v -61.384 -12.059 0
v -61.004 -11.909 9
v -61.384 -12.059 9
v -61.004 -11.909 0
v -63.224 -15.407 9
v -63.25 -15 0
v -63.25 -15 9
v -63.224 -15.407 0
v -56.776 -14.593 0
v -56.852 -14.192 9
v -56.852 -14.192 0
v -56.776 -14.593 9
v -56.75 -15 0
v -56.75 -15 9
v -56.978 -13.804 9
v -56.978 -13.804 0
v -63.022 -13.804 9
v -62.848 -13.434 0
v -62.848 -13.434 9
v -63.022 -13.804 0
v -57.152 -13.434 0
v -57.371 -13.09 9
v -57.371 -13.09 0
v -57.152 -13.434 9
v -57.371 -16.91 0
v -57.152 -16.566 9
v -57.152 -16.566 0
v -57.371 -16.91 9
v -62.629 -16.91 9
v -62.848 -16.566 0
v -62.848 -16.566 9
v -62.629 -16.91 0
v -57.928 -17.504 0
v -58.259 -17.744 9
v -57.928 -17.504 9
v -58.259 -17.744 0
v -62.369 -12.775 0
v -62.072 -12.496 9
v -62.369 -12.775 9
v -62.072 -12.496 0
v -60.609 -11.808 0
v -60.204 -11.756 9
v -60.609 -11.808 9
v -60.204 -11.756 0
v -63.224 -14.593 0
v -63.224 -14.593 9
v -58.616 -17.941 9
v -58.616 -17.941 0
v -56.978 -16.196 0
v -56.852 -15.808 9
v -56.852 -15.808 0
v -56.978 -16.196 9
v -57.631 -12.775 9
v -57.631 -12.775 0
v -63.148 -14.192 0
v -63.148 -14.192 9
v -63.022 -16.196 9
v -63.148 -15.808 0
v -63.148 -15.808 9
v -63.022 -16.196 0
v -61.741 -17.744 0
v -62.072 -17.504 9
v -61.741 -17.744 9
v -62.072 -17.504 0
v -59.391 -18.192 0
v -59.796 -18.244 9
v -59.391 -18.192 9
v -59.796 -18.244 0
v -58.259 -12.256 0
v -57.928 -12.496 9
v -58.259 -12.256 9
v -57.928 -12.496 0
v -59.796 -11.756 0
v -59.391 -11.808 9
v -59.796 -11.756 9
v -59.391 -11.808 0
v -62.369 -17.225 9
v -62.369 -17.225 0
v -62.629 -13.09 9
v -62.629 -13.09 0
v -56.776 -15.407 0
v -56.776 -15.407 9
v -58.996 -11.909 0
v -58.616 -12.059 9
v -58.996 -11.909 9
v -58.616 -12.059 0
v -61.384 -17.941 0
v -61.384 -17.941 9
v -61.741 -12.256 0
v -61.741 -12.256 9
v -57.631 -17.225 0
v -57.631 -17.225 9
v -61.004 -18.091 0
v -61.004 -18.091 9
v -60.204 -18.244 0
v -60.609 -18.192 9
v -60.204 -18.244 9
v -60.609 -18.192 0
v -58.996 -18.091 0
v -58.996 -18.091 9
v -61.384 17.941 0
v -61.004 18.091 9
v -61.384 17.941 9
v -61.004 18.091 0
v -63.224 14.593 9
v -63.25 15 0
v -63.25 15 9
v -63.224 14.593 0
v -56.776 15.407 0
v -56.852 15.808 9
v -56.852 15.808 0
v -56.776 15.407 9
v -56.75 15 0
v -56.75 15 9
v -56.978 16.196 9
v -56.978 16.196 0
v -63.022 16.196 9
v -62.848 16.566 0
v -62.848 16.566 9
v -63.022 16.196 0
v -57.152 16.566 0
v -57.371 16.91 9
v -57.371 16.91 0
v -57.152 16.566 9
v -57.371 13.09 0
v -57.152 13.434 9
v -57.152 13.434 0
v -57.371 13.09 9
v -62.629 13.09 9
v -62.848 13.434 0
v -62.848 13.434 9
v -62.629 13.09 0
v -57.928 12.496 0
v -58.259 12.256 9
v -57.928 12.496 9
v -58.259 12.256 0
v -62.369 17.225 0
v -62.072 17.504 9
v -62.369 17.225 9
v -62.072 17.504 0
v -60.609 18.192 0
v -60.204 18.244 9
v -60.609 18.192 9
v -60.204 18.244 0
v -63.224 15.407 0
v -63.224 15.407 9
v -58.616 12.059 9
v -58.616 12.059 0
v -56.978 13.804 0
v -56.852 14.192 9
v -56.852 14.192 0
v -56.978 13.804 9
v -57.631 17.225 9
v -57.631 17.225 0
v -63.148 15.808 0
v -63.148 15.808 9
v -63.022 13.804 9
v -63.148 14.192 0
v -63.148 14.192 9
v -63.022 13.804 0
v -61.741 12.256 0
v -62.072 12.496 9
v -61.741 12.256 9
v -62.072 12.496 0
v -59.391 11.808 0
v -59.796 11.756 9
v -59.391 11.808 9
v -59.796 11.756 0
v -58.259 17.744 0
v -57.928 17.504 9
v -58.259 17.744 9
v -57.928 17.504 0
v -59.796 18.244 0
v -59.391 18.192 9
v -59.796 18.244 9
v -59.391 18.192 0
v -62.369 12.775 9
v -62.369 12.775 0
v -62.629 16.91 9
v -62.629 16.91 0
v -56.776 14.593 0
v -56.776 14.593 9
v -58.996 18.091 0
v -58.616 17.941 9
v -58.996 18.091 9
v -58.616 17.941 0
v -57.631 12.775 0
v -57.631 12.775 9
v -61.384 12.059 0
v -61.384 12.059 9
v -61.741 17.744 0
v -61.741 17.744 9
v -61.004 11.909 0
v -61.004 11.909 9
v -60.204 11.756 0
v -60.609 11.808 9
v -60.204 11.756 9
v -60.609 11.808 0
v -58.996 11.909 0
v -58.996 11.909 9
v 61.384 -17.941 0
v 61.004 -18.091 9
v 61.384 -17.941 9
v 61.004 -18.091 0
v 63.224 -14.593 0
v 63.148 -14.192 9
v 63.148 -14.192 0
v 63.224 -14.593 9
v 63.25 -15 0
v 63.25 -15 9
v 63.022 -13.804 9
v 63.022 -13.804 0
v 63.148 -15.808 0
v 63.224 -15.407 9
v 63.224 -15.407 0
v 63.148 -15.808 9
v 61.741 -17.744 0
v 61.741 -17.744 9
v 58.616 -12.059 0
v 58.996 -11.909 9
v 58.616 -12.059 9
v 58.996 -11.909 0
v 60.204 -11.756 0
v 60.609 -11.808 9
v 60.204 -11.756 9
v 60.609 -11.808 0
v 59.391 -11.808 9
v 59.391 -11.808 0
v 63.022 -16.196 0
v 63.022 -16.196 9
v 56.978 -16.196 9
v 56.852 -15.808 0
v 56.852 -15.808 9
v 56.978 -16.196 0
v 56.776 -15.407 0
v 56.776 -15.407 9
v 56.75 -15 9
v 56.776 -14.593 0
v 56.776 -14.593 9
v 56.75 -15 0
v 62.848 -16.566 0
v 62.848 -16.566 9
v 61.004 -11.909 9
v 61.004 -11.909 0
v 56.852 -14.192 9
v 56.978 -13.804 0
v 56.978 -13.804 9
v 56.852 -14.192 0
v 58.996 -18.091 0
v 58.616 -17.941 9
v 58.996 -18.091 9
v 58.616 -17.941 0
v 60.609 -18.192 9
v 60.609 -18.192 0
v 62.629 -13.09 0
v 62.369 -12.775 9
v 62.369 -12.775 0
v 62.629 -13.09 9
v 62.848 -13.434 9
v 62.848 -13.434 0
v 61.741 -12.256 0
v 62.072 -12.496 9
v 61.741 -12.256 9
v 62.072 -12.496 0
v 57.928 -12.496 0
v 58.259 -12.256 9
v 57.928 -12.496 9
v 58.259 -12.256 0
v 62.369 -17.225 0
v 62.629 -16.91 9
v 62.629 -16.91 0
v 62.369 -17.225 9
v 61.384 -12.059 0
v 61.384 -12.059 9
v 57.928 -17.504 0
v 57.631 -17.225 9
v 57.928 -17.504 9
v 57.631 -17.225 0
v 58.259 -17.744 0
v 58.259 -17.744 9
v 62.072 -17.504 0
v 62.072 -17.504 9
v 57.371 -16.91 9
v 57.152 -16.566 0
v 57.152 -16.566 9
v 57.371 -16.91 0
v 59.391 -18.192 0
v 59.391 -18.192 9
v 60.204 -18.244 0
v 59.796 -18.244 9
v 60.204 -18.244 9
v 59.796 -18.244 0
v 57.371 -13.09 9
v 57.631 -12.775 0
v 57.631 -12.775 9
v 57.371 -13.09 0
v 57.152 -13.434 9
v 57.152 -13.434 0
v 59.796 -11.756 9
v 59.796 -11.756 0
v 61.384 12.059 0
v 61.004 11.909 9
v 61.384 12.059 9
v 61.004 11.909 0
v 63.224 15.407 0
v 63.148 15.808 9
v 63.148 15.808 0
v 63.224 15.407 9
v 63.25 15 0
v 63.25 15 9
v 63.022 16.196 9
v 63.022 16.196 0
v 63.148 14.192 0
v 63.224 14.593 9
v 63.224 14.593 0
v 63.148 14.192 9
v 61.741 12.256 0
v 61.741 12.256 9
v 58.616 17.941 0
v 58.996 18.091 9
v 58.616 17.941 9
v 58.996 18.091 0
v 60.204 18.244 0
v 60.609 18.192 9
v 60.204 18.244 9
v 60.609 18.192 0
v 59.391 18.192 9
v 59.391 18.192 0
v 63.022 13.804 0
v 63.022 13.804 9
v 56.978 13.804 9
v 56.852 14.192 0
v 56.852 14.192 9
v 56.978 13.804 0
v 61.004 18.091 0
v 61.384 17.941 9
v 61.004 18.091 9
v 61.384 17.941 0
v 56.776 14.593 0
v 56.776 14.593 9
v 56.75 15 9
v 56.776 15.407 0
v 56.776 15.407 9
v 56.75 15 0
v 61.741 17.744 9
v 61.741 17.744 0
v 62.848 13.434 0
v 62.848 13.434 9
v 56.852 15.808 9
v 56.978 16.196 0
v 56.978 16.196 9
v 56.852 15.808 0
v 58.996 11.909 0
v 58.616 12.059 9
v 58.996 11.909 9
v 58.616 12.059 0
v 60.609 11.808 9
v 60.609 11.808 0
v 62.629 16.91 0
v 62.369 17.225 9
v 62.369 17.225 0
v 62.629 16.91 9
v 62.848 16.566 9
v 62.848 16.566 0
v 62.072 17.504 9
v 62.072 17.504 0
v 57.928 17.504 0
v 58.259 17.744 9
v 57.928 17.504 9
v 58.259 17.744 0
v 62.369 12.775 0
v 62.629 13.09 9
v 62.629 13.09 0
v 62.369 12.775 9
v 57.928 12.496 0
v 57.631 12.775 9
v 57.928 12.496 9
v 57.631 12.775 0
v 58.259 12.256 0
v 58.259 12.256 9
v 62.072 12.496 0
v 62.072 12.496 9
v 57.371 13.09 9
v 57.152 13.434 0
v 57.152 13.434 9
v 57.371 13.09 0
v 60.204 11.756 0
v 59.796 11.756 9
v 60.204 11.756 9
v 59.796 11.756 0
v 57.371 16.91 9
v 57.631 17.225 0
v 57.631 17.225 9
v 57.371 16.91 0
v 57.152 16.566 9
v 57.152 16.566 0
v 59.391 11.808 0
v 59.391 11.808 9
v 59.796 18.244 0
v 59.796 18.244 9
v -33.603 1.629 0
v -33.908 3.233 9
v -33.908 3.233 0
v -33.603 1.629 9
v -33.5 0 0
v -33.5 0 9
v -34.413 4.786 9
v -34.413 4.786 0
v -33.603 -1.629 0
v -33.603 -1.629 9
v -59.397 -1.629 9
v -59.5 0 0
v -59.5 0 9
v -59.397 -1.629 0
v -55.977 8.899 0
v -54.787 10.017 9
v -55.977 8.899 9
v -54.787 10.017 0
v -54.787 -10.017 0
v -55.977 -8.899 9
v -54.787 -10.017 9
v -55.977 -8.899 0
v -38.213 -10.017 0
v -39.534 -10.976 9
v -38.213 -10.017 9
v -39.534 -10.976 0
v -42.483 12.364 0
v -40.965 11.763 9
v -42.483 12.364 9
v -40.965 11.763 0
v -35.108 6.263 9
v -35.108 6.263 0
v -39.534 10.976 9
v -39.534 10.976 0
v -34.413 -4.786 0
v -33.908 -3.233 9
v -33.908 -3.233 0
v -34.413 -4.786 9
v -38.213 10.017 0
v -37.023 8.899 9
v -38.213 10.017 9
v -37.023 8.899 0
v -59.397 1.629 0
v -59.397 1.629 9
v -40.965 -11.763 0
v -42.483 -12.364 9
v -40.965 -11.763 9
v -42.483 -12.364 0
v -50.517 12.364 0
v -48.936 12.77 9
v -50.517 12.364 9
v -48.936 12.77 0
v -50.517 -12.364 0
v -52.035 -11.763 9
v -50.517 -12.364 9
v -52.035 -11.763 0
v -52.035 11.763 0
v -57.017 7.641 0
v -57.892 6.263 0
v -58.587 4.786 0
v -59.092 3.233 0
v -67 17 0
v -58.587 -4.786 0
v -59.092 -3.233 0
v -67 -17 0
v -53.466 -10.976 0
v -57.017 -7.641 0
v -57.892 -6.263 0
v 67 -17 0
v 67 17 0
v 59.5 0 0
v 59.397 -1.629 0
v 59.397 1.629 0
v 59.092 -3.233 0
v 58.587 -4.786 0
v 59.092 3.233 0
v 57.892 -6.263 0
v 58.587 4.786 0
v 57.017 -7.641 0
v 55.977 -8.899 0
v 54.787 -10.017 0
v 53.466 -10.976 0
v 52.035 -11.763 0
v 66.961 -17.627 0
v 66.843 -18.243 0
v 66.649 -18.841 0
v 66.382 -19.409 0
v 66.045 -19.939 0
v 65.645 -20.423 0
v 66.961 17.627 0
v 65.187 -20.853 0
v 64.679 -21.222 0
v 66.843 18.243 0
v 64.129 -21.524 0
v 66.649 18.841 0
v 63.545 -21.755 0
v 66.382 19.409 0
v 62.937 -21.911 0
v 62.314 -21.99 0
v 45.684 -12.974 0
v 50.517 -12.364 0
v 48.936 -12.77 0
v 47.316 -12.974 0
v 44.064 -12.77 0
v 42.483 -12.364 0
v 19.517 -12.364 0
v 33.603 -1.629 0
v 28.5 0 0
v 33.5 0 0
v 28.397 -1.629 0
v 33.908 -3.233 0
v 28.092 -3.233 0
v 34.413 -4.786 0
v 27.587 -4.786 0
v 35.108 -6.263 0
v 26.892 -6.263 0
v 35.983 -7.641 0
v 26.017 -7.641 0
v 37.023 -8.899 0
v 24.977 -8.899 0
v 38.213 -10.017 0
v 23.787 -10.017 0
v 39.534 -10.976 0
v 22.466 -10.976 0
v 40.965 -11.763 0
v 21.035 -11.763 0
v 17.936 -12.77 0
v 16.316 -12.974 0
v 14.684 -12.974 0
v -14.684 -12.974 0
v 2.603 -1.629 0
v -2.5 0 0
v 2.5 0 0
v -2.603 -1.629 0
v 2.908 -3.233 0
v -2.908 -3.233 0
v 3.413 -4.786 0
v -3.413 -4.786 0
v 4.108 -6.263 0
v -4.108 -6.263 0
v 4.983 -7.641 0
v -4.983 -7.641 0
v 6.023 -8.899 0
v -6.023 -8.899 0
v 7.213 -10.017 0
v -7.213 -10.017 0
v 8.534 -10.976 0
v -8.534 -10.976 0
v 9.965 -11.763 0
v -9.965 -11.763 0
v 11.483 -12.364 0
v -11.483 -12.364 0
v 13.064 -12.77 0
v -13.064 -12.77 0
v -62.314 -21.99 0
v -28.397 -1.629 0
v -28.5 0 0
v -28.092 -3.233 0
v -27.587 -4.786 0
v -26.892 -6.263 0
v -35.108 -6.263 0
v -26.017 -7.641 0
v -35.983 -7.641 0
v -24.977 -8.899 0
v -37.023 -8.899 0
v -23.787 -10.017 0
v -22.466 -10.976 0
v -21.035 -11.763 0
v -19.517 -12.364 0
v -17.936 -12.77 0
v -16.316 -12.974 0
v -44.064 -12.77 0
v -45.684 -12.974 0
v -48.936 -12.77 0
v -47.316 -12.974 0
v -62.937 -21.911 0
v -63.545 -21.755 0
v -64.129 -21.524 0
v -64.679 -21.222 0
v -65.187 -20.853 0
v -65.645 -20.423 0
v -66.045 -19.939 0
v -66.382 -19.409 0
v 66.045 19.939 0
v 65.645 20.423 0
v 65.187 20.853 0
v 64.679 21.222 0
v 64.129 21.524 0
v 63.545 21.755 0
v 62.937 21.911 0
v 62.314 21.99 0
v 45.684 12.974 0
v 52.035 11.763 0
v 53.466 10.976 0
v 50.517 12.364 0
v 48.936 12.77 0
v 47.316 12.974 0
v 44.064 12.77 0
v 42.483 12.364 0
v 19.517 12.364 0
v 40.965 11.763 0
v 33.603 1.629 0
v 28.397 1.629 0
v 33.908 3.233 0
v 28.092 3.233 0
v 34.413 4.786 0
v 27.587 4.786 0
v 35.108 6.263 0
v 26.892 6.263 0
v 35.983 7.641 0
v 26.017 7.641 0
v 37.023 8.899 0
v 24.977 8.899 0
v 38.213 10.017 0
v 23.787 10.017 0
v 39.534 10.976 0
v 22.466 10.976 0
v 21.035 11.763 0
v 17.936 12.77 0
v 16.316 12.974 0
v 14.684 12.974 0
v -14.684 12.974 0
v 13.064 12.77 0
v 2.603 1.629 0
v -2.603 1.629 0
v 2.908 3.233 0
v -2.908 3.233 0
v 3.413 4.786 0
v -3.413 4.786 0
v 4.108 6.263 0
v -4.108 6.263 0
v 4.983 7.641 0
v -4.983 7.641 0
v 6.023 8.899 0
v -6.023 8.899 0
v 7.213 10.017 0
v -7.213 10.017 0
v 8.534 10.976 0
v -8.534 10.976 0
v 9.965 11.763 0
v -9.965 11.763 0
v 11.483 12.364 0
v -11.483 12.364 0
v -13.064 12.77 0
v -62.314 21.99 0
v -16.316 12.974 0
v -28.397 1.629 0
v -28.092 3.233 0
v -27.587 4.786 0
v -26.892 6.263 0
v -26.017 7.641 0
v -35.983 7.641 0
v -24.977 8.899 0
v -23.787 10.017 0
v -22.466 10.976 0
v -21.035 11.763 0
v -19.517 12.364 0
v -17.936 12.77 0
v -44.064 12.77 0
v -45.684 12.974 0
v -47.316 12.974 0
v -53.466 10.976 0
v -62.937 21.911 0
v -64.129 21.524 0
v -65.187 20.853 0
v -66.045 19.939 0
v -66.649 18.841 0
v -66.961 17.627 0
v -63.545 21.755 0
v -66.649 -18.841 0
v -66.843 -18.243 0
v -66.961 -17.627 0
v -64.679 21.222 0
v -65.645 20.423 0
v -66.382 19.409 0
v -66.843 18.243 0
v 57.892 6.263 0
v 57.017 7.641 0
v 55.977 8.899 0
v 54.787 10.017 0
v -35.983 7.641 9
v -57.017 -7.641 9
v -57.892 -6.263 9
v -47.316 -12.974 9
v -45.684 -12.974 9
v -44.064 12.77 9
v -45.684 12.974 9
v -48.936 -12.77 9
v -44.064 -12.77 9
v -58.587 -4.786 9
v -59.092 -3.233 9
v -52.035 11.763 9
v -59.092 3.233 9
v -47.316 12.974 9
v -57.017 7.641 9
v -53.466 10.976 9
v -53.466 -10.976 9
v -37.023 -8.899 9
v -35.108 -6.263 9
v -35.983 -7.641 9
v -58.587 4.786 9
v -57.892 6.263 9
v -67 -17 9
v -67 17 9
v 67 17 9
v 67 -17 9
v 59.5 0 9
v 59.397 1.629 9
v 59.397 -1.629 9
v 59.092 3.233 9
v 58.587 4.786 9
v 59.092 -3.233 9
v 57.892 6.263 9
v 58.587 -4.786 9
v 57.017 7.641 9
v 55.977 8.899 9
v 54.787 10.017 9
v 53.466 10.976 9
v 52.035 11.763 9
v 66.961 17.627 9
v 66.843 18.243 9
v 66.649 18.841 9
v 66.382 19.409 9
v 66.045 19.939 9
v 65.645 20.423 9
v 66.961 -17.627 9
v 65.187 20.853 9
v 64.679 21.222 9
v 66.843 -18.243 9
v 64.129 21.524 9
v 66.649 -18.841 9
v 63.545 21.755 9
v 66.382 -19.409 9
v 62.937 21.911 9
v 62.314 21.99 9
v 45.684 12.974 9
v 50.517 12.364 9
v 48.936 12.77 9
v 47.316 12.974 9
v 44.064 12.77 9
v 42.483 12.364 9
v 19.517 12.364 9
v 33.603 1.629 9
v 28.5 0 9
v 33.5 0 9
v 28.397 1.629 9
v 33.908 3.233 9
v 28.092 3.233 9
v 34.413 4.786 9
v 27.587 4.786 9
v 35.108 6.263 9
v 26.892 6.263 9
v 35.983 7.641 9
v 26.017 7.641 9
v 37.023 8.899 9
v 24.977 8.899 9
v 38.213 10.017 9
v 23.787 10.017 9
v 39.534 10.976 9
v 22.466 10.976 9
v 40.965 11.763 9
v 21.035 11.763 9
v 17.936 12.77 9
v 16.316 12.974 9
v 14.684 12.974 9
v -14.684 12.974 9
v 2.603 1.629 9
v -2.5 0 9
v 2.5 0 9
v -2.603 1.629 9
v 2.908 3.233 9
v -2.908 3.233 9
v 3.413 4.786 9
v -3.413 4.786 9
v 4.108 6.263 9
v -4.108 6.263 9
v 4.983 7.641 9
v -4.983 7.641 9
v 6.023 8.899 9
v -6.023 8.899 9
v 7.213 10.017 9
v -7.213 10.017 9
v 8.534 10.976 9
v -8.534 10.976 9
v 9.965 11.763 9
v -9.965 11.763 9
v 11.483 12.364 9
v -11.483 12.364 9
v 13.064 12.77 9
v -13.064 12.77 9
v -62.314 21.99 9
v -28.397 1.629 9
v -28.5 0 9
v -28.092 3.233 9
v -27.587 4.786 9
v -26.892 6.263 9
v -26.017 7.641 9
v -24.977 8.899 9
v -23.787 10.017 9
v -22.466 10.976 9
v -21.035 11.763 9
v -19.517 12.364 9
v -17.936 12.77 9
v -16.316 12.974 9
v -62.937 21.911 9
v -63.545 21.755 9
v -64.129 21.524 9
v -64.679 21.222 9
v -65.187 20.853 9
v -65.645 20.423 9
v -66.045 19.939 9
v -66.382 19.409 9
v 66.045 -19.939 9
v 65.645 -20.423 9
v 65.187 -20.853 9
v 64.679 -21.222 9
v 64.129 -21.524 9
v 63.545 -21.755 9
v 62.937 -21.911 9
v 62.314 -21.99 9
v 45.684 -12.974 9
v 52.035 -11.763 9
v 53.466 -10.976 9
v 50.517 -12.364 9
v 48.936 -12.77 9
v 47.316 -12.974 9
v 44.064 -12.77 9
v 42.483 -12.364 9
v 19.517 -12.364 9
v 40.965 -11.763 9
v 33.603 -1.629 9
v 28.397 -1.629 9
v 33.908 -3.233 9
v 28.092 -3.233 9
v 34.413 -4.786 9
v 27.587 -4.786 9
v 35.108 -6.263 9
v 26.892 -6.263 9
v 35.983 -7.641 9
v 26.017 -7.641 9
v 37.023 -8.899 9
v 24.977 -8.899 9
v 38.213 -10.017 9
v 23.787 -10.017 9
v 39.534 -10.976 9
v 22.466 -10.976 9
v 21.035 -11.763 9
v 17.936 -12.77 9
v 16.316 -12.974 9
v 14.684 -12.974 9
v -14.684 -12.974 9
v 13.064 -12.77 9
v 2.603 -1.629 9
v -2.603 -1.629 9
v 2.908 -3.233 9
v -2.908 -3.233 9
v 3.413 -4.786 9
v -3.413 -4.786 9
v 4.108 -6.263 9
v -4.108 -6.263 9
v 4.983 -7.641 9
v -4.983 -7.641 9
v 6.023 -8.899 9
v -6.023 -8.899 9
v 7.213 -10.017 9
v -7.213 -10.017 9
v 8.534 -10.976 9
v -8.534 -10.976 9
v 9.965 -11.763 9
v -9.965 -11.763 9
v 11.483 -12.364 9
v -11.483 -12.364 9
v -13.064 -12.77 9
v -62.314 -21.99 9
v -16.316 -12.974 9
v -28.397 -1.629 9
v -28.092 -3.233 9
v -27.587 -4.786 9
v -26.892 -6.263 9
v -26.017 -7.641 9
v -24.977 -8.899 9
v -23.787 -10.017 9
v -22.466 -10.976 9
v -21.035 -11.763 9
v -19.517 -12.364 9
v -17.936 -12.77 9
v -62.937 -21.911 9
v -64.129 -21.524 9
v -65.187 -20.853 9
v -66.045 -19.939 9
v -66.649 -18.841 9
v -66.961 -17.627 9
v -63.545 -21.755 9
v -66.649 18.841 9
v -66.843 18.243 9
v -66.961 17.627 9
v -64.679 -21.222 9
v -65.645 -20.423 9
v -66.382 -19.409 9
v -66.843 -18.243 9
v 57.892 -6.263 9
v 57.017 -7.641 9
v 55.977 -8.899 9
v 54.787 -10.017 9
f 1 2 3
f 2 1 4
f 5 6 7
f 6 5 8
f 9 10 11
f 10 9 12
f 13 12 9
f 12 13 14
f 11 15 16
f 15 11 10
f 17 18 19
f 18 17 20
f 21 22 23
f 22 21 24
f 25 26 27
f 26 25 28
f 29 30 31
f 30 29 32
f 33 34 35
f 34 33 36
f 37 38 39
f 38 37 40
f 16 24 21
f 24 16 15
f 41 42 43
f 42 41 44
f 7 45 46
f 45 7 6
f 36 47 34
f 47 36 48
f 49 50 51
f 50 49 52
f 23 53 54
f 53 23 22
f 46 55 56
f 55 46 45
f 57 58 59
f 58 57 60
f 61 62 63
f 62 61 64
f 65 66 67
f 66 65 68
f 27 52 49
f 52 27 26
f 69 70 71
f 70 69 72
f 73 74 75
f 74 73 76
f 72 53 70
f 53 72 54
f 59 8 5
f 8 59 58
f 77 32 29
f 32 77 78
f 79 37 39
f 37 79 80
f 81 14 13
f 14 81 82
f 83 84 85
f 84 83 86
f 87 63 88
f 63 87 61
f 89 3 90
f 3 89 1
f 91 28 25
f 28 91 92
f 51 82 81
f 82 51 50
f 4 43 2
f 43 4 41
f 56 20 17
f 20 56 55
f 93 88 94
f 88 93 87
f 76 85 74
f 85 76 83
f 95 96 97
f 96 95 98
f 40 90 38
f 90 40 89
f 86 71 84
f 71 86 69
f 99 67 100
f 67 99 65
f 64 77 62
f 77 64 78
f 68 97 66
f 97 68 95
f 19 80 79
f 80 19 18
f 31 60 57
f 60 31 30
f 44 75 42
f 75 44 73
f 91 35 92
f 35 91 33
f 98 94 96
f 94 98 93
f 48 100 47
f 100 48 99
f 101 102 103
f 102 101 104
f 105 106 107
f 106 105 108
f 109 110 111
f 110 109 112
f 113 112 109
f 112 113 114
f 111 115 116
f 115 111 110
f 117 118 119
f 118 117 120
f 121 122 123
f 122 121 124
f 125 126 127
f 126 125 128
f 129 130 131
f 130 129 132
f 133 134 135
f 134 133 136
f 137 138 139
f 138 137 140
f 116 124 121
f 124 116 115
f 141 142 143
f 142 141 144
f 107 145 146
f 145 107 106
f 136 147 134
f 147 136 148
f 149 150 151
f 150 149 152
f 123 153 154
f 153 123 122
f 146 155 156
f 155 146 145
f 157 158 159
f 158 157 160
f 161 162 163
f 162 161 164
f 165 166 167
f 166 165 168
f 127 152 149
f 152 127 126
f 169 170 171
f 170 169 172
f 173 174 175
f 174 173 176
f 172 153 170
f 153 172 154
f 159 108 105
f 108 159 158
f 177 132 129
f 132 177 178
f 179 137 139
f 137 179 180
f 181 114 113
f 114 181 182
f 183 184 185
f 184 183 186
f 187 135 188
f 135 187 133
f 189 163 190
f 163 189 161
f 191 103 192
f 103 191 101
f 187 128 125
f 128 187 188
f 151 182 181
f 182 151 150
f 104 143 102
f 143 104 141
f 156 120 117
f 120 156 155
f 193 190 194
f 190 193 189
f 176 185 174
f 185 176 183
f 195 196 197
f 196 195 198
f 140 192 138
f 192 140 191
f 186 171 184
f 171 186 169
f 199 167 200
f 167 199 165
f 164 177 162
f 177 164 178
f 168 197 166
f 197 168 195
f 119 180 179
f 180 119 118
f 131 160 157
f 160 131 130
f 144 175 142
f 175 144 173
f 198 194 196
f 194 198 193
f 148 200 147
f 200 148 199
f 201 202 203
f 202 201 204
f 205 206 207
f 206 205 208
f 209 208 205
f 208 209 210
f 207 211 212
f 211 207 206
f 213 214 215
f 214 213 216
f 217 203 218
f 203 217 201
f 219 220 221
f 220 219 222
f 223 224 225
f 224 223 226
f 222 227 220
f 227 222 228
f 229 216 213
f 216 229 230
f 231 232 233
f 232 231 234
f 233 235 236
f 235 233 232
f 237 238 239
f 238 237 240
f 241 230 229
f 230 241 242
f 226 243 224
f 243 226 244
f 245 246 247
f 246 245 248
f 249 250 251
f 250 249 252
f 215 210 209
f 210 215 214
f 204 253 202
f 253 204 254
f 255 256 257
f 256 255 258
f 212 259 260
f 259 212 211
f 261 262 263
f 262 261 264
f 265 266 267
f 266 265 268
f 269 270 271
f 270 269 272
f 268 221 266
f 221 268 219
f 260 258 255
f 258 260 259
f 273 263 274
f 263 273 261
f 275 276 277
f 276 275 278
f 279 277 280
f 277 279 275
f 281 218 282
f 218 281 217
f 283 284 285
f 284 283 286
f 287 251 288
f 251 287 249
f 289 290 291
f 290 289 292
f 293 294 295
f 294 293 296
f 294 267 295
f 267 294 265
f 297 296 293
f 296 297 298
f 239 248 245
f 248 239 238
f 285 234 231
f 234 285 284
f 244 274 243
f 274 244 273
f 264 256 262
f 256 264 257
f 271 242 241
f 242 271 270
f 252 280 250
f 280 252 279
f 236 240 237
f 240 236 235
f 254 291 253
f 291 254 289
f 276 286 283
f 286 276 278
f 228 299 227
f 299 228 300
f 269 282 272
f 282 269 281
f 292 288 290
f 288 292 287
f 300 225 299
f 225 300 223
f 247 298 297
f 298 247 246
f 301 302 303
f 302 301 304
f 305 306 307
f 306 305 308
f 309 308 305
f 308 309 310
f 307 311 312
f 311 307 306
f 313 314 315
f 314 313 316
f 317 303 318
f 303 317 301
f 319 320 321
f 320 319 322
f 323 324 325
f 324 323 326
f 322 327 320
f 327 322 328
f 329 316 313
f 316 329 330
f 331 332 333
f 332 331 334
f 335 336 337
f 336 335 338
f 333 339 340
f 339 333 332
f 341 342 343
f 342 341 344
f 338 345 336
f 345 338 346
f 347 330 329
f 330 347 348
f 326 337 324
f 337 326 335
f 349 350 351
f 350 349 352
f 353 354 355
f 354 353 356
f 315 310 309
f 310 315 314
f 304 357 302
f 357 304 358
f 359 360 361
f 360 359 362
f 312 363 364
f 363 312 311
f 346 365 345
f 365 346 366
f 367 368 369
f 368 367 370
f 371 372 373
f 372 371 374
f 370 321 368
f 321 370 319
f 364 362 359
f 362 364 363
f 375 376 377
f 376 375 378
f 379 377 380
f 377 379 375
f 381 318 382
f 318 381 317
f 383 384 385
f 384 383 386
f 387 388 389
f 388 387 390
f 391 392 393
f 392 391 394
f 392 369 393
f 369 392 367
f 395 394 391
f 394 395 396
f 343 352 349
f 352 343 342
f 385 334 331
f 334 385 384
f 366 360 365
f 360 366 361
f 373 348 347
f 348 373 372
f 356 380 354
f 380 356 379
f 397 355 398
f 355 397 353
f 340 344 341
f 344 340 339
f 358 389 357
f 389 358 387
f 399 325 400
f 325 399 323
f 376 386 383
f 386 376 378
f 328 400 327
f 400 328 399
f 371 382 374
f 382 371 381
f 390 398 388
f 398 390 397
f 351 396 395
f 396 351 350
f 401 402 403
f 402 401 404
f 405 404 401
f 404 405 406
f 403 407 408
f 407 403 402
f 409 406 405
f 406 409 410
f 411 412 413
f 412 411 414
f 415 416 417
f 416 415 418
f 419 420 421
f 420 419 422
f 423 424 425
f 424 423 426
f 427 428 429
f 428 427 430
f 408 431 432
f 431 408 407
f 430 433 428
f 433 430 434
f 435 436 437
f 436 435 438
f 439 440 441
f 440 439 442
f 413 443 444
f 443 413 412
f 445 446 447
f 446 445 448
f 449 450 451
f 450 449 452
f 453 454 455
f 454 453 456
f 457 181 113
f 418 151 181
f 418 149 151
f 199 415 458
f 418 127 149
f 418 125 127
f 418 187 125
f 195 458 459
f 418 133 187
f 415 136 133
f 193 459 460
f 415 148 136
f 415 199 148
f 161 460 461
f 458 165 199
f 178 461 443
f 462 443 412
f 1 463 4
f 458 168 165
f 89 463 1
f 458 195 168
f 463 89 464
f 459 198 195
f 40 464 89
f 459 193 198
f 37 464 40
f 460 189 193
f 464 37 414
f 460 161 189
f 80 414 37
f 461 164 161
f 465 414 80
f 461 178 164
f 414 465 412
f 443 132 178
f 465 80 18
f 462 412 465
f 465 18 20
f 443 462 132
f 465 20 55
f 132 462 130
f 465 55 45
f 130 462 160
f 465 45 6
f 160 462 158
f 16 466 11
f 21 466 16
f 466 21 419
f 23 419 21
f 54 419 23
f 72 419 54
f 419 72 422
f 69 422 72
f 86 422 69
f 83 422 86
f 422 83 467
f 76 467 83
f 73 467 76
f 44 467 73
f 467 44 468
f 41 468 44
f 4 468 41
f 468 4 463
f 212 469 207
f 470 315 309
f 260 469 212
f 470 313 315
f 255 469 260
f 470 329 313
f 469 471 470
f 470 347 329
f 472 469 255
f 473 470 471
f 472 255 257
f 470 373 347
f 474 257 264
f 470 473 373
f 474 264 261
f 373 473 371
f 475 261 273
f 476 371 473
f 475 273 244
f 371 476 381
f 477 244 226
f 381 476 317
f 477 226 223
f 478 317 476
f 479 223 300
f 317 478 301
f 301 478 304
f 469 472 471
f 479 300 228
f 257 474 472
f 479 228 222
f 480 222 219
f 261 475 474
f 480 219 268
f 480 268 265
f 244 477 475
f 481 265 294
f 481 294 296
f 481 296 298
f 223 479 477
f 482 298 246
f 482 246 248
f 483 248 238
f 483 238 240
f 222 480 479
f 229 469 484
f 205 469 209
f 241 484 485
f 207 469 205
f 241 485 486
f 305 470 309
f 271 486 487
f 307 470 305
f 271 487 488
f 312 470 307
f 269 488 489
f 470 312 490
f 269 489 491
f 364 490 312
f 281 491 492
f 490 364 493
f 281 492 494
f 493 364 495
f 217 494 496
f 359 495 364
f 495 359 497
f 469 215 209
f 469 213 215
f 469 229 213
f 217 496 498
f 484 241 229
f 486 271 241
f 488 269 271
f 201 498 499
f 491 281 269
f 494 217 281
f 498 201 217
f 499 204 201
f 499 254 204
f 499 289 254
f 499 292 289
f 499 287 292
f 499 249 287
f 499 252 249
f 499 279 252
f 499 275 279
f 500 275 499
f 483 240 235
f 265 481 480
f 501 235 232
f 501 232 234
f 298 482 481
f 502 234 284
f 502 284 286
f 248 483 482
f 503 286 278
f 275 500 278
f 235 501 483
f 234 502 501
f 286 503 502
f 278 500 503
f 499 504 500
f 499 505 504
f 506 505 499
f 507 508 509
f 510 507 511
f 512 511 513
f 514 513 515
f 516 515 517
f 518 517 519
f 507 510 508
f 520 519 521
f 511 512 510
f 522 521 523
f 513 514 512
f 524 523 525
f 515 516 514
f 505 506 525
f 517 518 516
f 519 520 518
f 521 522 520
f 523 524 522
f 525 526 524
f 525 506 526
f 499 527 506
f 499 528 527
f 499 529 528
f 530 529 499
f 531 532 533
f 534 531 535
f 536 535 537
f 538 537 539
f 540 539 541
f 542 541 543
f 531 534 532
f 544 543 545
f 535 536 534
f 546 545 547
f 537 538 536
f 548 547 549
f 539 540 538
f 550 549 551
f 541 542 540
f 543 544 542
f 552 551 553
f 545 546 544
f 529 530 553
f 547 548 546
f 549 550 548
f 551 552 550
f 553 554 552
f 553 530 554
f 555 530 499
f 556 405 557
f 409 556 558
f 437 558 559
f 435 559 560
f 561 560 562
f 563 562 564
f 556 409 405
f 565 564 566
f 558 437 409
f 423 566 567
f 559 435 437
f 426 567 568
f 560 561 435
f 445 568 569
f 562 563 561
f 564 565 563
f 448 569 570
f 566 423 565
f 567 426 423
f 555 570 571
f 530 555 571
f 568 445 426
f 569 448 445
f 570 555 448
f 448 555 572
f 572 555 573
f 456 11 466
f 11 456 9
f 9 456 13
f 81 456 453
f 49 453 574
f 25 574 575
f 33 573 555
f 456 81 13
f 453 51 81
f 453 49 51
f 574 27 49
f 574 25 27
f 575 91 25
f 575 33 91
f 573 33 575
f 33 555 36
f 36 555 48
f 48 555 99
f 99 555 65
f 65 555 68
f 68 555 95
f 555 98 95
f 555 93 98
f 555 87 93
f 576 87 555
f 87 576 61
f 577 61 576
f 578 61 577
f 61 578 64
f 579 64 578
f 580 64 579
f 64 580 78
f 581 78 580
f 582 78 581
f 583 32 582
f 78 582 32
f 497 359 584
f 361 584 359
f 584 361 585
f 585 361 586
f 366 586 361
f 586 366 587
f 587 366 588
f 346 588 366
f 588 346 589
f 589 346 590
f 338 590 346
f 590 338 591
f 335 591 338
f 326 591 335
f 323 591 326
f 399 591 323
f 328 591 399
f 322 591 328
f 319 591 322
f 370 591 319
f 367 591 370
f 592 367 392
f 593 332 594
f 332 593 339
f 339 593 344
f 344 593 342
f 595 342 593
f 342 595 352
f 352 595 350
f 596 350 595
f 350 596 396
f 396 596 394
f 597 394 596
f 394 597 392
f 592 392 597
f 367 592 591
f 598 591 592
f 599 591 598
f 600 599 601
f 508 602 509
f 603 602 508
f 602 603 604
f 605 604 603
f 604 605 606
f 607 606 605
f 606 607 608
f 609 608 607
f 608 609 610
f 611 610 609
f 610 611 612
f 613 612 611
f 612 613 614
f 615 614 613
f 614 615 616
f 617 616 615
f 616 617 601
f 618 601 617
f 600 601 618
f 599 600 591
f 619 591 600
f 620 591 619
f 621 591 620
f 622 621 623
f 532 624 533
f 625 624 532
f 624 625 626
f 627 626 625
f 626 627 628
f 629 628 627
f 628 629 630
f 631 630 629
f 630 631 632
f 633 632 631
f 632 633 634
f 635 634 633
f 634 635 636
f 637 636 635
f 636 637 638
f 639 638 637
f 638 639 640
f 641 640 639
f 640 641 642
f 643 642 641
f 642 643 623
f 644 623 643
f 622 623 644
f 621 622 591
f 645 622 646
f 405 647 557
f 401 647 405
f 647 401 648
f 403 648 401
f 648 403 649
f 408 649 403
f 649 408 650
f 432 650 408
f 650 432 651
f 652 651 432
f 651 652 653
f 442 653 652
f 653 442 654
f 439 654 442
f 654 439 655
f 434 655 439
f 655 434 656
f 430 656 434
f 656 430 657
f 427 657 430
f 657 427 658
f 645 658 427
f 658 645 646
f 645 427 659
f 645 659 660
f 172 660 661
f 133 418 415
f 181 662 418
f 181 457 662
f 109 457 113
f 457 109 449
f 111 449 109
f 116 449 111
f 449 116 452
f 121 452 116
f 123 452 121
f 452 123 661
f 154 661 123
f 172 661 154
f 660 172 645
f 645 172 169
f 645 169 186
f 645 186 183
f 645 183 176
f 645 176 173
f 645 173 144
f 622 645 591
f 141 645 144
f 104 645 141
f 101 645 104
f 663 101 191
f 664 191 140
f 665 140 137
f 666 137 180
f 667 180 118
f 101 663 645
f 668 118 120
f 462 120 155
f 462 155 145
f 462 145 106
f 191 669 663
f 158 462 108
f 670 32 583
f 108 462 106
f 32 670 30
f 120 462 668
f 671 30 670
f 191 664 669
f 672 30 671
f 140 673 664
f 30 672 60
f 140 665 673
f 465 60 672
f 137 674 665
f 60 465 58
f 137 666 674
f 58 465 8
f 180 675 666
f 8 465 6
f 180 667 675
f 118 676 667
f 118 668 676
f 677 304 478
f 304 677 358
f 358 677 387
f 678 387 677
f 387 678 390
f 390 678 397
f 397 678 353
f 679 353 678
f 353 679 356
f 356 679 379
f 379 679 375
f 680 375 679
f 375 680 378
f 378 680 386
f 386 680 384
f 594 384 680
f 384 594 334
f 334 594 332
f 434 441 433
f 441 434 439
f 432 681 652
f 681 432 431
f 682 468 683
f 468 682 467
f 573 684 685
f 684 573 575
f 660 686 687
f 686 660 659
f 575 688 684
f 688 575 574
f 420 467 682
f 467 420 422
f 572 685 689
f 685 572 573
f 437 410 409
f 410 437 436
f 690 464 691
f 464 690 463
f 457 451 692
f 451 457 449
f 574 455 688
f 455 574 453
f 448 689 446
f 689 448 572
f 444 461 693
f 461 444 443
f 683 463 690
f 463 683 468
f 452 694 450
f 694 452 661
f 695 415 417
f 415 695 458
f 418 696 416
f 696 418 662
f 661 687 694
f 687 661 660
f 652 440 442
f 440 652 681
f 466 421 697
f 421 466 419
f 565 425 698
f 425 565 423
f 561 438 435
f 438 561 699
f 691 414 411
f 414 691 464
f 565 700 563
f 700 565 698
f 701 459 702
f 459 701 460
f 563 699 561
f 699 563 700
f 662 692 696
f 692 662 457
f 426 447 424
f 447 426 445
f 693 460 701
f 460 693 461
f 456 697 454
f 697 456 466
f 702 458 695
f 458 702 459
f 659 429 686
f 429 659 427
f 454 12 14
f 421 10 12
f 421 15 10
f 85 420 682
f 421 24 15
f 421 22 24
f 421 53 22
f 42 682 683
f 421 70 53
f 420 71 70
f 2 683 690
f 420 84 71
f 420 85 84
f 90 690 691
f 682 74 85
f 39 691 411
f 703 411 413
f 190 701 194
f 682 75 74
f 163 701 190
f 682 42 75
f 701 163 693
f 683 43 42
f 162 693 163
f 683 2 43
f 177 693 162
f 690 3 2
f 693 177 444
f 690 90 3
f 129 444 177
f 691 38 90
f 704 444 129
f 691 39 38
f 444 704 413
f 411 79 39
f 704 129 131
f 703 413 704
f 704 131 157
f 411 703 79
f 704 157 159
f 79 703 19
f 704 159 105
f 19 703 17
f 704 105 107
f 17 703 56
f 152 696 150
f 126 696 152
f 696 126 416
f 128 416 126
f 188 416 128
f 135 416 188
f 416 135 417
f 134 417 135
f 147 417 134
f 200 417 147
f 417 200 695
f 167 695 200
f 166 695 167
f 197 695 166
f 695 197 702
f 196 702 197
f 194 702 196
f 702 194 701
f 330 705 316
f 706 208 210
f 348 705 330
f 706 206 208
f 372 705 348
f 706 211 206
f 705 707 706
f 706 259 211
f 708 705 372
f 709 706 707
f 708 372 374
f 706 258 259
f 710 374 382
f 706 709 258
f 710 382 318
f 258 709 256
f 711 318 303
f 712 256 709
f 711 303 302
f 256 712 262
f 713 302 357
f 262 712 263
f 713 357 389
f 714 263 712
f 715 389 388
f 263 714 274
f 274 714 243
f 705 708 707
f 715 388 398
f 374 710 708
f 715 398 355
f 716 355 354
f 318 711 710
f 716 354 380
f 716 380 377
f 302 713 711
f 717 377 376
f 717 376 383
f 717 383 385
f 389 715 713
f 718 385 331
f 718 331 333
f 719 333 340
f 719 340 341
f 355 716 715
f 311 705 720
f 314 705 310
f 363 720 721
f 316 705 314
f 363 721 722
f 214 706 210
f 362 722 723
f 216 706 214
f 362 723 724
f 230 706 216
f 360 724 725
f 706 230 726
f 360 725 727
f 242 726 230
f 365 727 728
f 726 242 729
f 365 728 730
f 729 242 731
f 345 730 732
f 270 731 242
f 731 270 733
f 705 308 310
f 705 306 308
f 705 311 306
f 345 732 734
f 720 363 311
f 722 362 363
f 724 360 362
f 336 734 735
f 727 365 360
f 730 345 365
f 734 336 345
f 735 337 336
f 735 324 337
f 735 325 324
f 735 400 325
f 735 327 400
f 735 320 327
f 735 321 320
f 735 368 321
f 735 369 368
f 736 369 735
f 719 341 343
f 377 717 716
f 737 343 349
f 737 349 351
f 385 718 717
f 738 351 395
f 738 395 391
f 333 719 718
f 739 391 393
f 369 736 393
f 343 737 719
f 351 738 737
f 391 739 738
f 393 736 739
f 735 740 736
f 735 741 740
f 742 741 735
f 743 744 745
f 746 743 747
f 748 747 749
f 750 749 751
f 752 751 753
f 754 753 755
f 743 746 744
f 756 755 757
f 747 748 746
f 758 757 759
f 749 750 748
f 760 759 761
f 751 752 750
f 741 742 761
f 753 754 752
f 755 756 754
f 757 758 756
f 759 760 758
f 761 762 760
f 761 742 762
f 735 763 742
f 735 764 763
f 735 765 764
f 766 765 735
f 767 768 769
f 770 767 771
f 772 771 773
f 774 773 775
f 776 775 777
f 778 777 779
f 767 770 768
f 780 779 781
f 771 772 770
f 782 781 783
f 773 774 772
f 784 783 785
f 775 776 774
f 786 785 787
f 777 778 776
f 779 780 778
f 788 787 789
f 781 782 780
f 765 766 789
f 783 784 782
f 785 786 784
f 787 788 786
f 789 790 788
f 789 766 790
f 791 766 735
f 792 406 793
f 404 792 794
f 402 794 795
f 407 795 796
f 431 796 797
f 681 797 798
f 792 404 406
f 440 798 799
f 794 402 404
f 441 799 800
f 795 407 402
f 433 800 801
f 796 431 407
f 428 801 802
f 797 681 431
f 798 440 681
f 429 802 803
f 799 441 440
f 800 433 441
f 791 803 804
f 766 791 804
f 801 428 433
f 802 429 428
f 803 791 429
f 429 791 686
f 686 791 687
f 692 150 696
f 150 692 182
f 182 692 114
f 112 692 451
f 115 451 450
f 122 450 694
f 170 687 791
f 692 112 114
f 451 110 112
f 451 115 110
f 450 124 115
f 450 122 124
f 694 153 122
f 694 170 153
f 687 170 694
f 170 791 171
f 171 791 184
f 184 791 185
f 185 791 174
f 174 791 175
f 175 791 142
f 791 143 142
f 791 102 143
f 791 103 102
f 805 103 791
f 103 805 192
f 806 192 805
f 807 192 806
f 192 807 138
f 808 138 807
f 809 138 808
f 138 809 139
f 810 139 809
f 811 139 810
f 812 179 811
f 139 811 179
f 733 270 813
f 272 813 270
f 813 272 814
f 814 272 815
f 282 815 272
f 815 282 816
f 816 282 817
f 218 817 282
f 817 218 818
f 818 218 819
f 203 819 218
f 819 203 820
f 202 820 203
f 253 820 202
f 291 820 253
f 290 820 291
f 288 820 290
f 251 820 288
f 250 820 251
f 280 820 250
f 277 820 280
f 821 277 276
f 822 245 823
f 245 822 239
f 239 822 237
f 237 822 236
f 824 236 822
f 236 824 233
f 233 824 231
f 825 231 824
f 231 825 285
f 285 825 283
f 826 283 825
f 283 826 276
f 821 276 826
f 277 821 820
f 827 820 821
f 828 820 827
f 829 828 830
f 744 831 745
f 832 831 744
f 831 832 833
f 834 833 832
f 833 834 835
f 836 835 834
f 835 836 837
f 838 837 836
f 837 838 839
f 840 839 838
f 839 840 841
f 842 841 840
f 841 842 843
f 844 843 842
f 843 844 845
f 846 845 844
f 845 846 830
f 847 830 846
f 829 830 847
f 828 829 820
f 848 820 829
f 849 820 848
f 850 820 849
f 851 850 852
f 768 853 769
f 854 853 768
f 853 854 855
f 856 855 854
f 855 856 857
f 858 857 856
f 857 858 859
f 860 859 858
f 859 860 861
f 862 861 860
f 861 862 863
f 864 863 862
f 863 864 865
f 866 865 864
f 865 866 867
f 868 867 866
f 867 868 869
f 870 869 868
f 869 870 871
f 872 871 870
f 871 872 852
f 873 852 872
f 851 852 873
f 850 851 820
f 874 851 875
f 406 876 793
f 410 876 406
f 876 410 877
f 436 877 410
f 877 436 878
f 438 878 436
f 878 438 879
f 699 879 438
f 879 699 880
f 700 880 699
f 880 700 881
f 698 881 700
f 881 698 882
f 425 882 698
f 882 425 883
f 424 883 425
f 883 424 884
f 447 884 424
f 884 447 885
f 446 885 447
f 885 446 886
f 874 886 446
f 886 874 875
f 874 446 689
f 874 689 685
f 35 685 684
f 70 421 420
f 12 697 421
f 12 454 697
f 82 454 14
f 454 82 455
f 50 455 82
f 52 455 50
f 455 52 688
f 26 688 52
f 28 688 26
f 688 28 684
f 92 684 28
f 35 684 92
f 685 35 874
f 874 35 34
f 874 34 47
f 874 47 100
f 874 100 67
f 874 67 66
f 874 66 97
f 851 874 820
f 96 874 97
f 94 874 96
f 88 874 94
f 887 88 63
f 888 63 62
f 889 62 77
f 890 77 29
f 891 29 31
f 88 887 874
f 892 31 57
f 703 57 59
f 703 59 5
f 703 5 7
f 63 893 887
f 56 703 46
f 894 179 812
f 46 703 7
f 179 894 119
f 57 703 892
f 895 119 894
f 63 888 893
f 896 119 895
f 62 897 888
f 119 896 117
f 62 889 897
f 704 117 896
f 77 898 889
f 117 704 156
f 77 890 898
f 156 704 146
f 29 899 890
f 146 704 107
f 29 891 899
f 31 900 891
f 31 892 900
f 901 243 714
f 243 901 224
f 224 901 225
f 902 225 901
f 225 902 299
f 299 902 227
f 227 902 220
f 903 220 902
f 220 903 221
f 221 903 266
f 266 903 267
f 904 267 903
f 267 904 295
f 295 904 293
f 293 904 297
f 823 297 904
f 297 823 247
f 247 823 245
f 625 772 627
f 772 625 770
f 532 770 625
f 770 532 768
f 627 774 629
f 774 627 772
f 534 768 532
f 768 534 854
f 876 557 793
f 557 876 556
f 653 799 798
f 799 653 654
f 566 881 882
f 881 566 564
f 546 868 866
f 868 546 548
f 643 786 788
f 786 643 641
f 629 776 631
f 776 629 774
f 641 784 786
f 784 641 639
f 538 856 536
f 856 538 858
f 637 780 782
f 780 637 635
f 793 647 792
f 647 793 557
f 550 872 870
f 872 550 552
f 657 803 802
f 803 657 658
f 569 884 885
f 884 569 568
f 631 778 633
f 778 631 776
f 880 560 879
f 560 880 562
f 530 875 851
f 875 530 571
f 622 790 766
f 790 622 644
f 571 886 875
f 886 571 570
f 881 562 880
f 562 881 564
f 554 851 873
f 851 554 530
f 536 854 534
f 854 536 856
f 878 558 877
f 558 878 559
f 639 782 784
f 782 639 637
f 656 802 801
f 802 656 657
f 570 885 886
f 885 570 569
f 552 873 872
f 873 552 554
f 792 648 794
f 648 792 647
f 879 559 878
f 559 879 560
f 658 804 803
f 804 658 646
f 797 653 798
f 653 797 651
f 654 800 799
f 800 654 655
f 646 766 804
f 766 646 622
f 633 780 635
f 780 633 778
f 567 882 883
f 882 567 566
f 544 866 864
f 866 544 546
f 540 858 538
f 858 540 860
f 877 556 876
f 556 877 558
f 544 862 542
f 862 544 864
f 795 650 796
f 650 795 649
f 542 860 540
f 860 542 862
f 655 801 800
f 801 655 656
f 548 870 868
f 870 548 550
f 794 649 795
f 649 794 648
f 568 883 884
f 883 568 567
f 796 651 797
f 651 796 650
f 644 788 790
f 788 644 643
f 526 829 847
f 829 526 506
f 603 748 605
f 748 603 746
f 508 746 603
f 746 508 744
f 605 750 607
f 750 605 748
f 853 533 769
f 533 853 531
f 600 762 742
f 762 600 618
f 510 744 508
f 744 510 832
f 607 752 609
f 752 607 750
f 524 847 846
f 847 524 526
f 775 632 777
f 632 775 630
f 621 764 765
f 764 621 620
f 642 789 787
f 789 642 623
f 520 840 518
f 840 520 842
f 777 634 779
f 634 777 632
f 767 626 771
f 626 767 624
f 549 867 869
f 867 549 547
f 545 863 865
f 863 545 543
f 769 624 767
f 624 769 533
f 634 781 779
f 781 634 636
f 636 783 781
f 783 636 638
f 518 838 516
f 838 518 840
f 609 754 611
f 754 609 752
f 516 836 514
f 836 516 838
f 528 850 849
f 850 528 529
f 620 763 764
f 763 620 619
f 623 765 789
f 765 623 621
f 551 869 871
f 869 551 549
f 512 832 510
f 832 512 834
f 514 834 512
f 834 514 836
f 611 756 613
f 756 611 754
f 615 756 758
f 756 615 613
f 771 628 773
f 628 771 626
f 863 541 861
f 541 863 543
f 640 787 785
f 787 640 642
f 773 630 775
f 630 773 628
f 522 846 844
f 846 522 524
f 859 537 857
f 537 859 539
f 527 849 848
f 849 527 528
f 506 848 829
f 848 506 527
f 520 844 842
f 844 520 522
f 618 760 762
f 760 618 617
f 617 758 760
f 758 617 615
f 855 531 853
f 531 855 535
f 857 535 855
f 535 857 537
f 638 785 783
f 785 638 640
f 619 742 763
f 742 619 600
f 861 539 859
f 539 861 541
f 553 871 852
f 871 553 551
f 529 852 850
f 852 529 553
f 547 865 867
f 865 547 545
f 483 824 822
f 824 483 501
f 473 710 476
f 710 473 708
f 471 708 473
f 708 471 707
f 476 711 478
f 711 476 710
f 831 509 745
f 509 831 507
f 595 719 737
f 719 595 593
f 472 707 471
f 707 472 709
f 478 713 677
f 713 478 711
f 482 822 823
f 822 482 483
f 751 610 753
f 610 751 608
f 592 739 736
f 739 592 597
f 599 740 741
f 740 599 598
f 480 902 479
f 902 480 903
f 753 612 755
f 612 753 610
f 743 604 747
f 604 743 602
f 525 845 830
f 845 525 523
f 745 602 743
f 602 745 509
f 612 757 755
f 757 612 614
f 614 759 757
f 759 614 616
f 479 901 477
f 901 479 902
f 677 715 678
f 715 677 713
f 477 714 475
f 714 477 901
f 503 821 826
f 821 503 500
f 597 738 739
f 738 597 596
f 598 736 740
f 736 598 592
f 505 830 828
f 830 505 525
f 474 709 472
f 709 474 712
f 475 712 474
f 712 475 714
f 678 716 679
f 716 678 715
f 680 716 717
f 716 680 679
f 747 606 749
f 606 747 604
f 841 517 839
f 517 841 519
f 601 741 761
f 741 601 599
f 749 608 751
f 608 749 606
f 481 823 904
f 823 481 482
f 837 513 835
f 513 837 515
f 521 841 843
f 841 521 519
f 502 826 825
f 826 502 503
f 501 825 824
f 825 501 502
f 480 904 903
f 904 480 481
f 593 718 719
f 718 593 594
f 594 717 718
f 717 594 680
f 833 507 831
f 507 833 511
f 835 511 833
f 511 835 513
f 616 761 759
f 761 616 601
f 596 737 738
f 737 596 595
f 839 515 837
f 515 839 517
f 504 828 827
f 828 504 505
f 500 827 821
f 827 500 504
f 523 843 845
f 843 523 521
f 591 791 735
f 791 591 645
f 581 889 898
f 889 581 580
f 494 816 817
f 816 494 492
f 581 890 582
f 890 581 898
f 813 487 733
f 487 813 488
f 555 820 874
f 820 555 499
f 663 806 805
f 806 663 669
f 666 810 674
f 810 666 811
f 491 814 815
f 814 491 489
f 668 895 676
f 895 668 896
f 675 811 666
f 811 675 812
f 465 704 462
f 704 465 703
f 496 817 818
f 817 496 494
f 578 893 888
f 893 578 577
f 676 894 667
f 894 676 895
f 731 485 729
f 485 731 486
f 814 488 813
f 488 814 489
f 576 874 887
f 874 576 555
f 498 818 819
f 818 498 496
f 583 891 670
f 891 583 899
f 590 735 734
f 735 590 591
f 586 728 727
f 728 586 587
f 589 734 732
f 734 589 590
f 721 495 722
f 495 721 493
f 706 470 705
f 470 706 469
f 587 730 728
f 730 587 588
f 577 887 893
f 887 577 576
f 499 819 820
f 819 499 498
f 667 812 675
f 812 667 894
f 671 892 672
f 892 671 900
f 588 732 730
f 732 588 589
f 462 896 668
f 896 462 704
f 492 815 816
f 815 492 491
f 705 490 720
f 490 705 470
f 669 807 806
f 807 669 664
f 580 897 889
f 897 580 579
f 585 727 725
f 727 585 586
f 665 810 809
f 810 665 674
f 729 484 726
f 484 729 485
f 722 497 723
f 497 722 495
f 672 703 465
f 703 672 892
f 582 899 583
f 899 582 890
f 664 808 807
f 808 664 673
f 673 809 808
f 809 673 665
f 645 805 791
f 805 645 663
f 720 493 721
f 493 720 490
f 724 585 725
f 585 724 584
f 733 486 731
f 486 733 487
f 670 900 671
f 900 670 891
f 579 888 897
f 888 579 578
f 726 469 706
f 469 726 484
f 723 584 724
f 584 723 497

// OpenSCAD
$fn = 50;


difference() {
	union() {
		hull() {
			translate(v = [-62.0000000000, 17.0000000000, 0]) {
				cylinder(h = 9, r = 5);
			}
			translate(v = [62.0000000000, 17.0000000000, 0]) {
				cylinder(h = 9, r = 5);
			}
			translate(v = [-62.0000000000, -17.0000000000, 0]) {
				cylinder(h = 9, r = 5);
			}
			translate(v = [62.0000000000, -17.0000000000, 0]) {
				cylinder(h = 9, r = 5);
			}
		}
	}
	union() {
		#translate(v = [-60.0000000000, -15.0000000000, -100.0000000000]) {
			cylinder(h = 200, r = 3.2500000000);
		}
		#translate(v = [-60.0000000000, 15.0000000000, -100.0000000000]) {
			cylinder(h = 200, r = 3.2500000000);
		}
		#translate(v = [60.0000000000, -15.0000000000, -100.0000000000]) {
			cylinder(h = 200, r = 3.2500000000);
		}
		#translate(v = [60.0000000000, 15.0000000000, -100.0000000000]) {
			cylinder(h = 200, r = 3.2500000000);
		}
		#translate(v = [-46.5000000000, 0, 0]) {
			cylinder(h = 9, r = 13.0000000000);
		}
		#translate(v = [-15.5000000000, 0, 0]) {
			cylinder(h = 9, r = 13.0000000000);
		}
		#translate(v = [15.5000000000, 0, 0]) {
			cylinder(h = 9, r = 13.0000000000);
		}
		#translate(v = [46.5000000000, 0, 0]) {
			cylinder(h = 9, r = 13.0000000000);
		}
	}
}
